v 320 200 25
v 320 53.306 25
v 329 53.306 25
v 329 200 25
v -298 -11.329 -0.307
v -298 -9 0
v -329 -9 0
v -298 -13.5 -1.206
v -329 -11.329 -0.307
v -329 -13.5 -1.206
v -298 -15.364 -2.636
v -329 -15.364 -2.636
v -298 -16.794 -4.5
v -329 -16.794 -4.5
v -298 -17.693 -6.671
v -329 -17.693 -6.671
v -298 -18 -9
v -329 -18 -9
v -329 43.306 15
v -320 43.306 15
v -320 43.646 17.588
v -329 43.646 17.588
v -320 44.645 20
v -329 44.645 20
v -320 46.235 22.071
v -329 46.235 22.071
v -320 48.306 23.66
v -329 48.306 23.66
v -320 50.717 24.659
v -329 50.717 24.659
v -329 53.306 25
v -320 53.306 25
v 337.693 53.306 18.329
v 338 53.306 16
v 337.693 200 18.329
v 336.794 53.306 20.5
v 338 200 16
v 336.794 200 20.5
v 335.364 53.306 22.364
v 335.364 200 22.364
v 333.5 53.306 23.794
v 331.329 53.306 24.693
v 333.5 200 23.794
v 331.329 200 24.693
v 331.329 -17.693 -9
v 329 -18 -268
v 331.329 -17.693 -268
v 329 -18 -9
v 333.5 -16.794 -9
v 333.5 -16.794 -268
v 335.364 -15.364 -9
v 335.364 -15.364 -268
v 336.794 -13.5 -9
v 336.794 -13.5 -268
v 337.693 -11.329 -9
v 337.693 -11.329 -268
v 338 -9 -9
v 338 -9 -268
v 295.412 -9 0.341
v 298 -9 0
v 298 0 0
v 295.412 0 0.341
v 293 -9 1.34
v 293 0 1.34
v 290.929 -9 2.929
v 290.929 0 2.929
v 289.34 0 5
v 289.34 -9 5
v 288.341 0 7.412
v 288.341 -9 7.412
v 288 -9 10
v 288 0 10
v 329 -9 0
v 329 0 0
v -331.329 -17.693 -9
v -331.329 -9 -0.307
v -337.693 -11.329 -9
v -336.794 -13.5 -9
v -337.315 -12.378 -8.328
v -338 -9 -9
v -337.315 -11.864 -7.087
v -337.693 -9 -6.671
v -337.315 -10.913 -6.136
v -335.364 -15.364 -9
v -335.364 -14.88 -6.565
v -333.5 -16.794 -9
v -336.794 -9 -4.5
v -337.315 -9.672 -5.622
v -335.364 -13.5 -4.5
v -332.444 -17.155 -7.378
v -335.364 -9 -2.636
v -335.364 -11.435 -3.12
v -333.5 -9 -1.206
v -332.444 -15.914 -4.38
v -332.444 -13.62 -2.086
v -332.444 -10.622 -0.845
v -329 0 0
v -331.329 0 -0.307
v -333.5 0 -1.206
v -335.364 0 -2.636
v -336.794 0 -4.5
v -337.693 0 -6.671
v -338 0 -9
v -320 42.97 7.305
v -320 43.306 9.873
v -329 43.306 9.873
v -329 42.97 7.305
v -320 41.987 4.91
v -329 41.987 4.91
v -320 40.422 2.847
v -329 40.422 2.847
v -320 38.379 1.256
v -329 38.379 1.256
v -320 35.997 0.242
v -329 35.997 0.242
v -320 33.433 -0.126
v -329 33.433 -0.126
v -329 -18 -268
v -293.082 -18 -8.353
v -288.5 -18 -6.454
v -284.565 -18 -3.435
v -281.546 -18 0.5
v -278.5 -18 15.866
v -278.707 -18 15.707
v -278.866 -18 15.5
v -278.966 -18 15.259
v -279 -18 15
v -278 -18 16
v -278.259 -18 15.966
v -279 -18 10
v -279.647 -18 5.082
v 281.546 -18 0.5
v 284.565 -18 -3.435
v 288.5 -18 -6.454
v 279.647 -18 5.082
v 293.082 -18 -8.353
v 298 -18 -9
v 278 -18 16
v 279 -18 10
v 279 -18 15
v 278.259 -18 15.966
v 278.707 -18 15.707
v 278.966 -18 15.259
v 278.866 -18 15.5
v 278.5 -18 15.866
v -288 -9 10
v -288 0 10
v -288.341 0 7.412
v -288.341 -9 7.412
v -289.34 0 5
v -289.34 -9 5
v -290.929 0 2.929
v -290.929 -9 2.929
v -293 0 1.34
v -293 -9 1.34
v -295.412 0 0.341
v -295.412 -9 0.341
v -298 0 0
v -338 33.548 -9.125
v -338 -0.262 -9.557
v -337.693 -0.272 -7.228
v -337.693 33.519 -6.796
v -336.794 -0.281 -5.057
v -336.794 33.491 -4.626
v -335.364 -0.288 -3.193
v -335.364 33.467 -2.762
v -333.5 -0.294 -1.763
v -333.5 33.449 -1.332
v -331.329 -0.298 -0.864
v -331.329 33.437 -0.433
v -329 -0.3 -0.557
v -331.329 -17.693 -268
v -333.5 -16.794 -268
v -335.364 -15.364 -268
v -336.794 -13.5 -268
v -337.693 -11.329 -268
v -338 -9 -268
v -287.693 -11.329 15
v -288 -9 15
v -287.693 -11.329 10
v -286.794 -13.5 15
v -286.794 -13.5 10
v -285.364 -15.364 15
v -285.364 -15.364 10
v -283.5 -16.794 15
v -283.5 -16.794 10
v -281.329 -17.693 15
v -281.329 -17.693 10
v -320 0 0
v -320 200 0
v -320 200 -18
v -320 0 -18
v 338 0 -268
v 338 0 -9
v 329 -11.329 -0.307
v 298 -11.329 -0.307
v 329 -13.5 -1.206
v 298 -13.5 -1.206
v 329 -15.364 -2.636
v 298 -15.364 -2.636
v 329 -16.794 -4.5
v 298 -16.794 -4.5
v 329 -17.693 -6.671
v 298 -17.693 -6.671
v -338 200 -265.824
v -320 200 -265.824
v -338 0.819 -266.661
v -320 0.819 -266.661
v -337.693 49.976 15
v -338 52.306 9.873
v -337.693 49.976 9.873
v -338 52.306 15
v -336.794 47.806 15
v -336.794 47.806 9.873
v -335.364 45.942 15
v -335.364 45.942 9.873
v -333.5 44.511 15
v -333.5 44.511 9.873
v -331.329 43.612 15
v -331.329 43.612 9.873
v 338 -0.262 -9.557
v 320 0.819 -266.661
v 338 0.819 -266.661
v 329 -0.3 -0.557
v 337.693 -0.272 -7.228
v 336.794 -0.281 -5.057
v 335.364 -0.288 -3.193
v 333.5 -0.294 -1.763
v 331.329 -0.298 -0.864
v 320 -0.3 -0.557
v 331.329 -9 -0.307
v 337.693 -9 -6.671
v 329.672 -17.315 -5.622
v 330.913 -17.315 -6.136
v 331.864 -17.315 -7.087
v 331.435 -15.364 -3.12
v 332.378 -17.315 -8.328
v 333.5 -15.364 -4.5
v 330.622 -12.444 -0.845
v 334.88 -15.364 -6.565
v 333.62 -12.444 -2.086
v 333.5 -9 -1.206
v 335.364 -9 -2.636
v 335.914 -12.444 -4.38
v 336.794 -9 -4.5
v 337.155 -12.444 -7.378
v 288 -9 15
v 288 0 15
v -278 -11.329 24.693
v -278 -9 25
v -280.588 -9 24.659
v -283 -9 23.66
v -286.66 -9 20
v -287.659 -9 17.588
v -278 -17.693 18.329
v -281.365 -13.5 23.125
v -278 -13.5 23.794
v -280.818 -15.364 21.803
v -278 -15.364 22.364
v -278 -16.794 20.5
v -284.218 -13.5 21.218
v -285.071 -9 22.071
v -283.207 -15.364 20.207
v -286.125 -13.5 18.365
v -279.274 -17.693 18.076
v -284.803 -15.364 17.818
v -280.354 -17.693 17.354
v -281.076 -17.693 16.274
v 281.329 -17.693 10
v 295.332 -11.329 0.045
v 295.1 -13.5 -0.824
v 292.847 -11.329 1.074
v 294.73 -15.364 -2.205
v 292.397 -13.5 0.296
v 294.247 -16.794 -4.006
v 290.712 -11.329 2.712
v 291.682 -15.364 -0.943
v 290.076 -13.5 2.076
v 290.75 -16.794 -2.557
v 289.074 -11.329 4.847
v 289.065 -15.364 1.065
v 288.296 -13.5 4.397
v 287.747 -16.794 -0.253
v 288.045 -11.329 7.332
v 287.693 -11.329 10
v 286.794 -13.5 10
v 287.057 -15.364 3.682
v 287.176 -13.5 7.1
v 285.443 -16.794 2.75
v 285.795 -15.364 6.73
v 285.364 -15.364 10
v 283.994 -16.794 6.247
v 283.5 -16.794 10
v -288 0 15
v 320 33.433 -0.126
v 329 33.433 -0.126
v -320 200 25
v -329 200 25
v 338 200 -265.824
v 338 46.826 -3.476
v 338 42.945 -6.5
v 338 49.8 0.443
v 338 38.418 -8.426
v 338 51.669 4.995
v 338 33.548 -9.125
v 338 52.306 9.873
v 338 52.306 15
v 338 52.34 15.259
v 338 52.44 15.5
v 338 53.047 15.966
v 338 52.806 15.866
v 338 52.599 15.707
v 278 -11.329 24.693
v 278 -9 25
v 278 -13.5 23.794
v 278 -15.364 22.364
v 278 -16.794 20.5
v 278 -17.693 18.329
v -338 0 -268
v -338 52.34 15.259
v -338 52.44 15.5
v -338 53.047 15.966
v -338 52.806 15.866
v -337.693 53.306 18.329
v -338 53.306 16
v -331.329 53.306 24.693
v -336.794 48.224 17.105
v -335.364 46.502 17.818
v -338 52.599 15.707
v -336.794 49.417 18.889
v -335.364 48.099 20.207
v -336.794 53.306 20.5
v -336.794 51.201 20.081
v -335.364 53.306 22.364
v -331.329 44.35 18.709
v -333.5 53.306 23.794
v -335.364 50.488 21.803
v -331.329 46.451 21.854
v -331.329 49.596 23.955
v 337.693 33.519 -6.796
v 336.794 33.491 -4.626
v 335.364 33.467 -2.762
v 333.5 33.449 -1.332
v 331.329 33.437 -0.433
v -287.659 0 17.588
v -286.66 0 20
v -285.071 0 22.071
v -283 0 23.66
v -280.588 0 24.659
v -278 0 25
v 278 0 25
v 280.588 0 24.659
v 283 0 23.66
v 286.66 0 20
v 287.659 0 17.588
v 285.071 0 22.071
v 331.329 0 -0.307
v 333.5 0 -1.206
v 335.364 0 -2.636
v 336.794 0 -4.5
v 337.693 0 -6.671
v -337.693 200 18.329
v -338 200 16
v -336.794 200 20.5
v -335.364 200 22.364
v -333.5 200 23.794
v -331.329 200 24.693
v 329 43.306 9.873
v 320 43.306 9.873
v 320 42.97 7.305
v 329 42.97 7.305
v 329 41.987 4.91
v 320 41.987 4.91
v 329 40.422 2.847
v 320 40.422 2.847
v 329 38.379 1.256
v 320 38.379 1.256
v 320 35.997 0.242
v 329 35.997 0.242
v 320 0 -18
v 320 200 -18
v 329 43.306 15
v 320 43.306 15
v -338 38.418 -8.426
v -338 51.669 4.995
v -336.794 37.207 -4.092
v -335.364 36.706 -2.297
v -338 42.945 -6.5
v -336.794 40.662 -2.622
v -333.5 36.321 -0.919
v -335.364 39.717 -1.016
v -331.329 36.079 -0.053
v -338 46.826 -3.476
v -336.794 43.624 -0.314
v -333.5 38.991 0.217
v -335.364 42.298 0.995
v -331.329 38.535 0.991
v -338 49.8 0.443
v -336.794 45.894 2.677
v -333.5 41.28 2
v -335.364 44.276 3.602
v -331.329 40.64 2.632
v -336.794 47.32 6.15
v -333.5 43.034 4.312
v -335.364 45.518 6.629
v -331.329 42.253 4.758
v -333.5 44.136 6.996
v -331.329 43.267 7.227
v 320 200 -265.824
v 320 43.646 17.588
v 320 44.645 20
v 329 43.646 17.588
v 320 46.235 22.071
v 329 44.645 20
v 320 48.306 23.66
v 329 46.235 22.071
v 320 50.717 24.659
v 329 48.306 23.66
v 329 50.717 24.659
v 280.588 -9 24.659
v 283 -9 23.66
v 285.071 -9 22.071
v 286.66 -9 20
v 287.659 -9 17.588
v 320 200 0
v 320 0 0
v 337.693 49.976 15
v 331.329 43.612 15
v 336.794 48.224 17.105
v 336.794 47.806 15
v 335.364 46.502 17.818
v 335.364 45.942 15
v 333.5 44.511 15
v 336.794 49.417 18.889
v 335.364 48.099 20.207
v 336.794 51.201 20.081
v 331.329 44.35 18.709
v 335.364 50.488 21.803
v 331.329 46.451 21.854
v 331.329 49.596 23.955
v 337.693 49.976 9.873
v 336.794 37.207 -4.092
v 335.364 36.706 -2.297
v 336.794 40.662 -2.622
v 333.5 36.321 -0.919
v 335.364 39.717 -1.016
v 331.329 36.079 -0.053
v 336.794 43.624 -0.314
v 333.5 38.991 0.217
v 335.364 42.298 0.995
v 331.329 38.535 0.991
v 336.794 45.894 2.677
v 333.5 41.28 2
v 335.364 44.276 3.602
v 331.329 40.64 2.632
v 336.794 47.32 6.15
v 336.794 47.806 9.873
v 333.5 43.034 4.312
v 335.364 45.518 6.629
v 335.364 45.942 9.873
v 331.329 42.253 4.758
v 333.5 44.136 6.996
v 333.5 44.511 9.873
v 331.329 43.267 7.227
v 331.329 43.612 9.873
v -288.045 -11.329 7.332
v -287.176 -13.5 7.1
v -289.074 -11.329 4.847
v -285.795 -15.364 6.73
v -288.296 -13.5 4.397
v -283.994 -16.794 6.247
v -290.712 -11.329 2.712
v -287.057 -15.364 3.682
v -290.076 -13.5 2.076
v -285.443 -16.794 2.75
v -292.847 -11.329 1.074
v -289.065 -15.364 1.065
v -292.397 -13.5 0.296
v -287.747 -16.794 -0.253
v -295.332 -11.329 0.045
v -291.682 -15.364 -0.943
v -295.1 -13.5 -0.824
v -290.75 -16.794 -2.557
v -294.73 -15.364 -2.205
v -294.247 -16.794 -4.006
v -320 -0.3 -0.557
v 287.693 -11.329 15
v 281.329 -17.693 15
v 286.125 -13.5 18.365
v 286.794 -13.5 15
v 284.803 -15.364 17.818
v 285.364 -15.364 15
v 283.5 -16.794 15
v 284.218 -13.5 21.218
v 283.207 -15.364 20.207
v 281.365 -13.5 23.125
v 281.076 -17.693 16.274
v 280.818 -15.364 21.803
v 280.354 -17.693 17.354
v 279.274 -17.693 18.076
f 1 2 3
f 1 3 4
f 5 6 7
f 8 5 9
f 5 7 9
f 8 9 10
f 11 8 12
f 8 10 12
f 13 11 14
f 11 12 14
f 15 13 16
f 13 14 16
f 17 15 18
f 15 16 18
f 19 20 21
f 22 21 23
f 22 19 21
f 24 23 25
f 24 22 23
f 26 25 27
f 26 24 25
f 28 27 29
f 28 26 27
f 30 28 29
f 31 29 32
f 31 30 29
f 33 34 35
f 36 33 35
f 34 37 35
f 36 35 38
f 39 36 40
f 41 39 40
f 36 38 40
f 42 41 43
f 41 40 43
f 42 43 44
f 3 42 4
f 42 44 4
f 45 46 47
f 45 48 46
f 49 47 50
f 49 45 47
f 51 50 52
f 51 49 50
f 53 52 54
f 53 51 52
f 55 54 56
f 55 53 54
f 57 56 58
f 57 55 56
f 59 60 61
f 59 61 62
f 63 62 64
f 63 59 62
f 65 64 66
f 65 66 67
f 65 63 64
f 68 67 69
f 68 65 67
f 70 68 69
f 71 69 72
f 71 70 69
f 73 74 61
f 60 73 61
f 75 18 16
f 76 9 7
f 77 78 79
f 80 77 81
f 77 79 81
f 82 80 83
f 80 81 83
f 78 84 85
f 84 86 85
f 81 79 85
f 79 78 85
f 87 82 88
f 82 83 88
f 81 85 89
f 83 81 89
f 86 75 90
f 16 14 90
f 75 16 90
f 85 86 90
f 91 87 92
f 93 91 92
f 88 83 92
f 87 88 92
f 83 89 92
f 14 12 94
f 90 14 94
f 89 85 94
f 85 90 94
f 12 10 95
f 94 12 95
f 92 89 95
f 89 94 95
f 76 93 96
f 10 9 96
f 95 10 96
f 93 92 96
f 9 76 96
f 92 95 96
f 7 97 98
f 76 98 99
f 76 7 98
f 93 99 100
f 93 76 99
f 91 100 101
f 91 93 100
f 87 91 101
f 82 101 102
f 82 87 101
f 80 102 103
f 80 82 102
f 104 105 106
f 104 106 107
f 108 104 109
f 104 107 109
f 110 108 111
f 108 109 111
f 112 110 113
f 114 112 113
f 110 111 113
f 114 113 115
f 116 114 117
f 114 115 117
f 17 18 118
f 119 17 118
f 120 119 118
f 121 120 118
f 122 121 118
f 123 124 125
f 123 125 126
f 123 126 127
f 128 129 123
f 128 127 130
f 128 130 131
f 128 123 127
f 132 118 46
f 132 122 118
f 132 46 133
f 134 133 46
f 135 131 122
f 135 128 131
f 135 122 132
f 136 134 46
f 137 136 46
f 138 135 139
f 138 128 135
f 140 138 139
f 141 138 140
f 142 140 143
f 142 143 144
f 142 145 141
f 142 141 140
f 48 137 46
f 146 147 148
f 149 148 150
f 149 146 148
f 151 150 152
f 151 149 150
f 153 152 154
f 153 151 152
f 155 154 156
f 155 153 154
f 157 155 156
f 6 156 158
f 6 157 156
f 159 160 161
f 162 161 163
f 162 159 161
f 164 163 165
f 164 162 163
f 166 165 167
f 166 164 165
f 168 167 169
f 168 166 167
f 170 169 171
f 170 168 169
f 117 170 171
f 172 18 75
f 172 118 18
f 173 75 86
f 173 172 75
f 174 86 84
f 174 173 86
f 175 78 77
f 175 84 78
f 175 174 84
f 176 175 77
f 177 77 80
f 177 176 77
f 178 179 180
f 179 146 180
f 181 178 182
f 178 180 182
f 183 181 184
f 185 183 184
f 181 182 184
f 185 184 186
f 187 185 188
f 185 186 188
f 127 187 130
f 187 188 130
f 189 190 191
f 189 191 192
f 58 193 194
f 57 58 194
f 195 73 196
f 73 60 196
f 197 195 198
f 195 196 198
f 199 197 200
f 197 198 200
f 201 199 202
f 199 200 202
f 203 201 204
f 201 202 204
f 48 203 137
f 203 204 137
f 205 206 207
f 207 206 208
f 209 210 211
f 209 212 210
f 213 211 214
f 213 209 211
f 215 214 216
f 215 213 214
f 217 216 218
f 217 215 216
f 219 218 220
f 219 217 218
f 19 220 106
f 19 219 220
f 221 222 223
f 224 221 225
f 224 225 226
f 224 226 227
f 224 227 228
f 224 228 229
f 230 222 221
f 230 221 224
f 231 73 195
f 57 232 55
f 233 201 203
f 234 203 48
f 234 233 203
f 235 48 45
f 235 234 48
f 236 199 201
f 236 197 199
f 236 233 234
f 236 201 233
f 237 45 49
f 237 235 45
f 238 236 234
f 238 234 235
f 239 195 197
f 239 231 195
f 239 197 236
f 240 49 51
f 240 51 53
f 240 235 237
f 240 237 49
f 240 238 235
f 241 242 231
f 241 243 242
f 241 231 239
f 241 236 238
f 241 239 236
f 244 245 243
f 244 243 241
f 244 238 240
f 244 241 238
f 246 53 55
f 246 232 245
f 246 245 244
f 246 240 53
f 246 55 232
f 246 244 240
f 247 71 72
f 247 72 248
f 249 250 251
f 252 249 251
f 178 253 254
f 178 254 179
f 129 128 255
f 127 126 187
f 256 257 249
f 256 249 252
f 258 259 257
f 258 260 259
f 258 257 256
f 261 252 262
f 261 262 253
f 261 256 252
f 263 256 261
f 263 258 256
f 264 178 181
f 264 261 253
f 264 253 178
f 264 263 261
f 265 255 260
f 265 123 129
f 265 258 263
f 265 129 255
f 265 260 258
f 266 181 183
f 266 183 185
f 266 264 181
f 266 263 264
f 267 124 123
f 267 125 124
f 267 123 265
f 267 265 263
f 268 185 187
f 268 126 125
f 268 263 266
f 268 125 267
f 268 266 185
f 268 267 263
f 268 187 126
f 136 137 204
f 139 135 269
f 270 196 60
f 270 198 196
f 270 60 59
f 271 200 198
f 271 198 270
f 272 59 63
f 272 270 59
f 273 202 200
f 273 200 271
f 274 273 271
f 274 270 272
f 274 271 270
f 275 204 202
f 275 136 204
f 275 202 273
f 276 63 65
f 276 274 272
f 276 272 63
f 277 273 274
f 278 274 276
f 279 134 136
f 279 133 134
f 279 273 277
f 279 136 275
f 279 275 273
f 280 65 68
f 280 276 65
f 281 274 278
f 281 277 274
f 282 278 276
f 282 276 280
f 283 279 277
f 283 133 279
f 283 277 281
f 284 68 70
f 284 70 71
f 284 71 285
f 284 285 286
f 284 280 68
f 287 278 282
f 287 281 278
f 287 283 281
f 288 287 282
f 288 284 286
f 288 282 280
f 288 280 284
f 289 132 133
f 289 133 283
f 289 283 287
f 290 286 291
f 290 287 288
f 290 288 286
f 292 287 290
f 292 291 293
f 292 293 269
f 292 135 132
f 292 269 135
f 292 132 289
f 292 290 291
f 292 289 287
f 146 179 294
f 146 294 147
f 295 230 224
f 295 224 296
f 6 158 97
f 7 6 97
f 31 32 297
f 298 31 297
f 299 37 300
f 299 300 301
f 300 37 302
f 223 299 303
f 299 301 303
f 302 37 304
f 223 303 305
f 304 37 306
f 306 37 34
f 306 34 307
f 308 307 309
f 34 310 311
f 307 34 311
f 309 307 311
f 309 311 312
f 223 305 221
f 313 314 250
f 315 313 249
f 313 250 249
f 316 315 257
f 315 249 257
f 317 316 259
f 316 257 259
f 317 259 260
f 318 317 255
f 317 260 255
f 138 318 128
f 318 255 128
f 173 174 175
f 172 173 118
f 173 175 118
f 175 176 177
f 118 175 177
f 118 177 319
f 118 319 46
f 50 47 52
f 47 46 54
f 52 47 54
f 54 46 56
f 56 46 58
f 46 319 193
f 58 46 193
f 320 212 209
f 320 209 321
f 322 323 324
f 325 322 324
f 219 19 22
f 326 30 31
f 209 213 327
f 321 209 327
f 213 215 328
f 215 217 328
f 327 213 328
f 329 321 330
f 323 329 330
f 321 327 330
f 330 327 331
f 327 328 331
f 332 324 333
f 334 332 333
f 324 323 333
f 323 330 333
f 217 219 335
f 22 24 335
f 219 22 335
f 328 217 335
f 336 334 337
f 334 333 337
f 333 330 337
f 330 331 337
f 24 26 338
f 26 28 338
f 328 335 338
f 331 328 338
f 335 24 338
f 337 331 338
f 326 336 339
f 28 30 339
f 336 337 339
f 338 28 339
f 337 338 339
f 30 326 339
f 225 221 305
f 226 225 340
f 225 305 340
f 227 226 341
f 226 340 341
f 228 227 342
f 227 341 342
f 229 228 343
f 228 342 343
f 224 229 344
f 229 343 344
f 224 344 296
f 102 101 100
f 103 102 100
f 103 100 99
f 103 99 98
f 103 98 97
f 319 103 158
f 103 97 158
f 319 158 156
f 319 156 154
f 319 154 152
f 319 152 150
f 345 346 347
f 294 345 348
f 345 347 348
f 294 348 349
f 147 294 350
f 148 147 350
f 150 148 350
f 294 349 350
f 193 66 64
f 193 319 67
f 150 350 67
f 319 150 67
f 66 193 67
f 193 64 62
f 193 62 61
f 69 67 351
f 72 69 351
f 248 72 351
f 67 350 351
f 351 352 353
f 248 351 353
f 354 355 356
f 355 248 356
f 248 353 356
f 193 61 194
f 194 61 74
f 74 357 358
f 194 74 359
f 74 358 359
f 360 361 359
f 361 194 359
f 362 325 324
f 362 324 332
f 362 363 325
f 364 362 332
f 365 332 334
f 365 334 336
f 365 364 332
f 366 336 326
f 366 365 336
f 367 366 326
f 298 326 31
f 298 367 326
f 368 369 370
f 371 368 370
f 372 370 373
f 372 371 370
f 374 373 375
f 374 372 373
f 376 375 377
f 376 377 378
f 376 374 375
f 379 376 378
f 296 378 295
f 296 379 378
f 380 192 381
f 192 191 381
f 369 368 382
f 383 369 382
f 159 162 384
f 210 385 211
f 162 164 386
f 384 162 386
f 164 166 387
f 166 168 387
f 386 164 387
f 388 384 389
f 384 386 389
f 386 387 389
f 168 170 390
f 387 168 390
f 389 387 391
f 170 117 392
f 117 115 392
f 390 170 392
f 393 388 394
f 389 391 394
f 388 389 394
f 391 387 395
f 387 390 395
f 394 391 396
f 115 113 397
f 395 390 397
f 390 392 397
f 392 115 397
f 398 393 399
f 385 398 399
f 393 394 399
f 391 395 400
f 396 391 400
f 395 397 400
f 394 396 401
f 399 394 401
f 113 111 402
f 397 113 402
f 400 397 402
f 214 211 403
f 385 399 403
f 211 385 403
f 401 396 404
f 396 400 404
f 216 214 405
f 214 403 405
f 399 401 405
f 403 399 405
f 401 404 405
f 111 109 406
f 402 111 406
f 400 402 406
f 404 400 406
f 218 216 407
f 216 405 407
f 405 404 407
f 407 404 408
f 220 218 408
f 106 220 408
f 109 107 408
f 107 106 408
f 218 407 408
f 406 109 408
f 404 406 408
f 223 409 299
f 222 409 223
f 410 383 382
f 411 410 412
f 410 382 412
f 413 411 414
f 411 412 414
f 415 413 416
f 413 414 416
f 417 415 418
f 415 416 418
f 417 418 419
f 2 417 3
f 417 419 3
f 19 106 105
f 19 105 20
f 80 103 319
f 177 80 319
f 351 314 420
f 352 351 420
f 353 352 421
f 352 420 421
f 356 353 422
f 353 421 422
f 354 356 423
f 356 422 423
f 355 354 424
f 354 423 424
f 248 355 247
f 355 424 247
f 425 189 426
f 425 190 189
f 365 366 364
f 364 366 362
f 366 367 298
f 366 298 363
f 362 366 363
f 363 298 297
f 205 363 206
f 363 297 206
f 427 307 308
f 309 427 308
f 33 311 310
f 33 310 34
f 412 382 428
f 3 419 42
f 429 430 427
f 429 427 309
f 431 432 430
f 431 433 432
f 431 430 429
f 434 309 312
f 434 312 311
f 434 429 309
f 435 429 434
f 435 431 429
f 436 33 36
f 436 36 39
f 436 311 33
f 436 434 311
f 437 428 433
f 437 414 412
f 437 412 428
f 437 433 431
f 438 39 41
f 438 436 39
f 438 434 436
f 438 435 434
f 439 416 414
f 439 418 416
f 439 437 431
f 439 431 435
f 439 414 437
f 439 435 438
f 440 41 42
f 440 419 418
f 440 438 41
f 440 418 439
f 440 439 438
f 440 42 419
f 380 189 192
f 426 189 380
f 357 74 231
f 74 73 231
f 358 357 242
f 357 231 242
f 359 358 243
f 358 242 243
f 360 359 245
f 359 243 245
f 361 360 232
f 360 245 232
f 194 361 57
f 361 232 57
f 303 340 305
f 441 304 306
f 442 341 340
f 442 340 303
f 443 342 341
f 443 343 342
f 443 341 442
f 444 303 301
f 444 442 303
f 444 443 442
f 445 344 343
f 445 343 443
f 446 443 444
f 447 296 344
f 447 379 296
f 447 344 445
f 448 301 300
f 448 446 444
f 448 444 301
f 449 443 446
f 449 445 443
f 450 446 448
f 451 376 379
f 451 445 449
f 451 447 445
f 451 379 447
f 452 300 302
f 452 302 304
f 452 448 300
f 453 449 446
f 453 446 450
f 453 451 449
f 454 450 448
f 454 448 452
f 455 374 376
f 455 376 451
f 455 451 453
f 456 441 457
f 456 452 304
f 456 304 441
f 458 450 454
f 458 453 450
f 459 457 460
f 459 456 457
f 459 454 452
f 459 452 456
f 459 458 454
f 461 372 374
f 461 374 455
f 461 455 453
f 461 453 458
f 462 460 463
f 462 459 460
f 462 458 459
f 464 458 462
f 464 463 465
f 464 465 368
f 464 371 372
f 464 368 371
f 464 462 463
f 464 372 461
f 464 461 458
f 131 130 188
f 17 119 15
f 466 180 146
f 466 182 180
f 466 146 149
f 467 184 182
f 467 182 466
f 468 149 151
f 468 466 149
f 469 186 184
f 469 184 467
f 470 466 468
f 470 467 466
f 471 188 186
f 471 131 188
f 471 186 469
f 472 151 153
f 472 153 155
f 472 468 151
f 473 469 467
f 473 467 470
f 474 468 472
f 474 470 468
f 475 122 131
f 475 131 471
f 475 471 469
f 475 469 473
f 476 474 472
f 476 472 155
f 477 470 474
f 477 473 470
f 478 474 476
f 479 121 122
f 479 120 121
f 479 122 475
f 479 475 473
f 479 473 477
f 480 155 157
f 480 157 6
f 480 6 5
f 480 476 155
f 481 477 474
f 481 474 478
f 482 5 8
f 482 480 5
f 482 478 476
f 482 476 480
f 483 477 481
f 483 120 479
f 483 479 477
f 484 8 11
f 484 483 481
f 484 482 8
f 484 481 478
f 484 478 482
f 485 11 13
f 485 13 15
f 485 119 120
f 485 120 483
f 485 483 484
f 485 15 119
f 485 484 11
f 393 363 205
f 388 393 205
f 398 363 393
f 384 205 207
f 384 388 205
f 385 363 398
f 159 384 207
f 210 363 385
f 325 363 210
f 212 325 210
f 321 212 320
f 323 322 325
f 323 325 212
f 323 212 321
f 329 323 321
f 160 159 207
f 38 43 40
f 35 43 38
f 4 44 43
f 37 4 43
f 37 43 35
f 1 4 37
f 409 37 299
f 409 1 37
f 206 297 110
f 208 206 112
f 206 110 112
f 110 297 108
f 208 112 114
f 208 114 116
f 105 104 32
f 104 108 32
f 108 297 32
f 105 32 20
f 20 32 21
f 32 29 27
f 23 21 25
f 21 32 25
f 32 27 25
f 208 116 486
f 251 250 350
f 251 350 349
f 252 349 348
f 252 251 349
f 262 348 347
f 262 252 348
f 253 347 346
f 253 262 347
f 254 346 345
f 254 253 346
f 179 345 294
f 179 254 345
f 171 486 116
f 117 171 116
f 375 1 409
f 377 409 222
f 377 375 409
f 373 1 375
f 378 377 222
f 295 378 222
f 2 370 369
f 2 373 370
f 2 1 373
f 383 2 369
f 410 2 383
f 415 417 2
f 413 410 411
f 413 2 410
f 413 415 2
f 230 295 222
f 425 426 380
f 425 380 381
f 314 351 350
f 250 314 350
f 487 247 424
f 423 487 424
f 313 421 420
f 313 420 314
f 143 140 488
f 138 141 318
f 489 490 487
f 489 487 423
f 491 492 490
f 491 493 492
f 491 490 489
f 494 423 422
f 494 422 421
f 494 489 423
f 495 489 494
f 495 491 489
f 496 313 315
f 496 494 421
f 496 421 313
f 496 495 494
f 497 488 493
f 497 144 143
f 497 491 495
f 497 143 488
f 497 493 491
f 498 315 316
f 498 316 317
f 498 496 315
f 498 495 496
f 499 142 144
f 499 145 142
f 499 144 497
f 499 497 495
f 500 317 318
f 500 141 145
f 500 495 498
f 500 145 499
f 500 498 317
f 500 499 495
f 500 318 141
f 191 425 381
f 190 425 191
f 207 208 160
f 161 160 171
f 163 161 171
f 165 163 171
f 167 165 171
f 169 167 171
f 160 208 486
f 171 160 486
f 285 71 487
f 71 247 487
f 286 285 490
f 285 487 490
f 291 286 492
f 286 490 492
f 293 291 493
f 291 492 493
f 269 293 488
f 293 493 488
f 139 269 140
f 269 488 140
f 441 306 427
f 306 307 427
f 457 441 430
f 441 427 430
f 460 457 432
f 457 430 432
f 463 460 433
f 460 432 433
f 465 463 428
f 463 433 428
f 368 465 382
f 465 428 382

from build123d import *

# Parameters (mm, degrees)
F1_DEPTH = 18
F3_DEPTH = 18
F6_DEPTH = 18
F8_R     = 10
F8_2_R   = 10
F9_R     = 9
F9_2_R   = 9


with BuildPart() as f1:
    # F0 (on Top) → F1 (new body)
    with BuildSketch(Plane.XY):
        Polygon((-320, 0), (0, 0), (320, 0), (320, 200), (0, 200), (-320, 200), align=None)
    extrude(amount=-F1_DEPTH)


with BuildPart() as f3:
    # F2 (on Front) → F3 (new body)
    with BuildSketch(Plane.XZ):
        Polygon((288, 25), (0, 25), (-288, 25), (-288, 0), (-338, 0), (-338, -268), (0, -268), (338, -268), (338, 0), (288, 0), align=None)
    extrude(amount=F3_DEPTH)

    # F8#2
    f8_2_edges = [f3.edges().sort_by_distance(p)[0] for p in [
        (288, -9, 0),
        (-288, -9, 25),
        (-288, -9, 0),
        (288, -9, 25),
    ]]
    fillet(f8_2_edges, radius=F8_2_R)

    # F9#2
    f9_2_edges = [f3.edges().sort_by_distance(p)[0] for p in [
        (338, -9, 0),
        (0, -18, 25),
        (338, -18, -134),
        (-338, -18, -134),
        (-338, -9, 0),
    ]]
    fillet(f9_2_edges, radius=F9_2_R)


with BuildPart() as f6:
    # F5 (on face) → F6 (new body)
    with BuildSketch(Plane(origin=(320, 0, 0), x_dir=(0, -1, 0), z_dir=(-1, 0, 0))):
        Polygon((-43.30568, 0), (-43.30568, 25), (-200, 25), (-200, -265.823858), (-0.818532, -266.66075), (0.299544, -0.557066), align=None)
    extrude(amount=-F6_DEPTH)

    # F8
    f8_edges = [f6.edges().sort_by_distance(p)[0] for p in [
        (329, 43.30568, 0),
        (329, 43.30568, 25),
    ]]
    fillet(f8_edges, radius=F8_R)

    # F9
    f9_edges = [f6.edges().sort_by_distance(p)[0] for p in [
        (338, 126.65284, 25),
    ]]
    fillet(f9_edges, radius=F9_R)


with BuildPart() as f7_1:
    # F7: instance of F6
    add(f6.part.mirror(Plane.YZ))


solid = Compound([f1.part, f3.part, f6.part, f7_1.part])
